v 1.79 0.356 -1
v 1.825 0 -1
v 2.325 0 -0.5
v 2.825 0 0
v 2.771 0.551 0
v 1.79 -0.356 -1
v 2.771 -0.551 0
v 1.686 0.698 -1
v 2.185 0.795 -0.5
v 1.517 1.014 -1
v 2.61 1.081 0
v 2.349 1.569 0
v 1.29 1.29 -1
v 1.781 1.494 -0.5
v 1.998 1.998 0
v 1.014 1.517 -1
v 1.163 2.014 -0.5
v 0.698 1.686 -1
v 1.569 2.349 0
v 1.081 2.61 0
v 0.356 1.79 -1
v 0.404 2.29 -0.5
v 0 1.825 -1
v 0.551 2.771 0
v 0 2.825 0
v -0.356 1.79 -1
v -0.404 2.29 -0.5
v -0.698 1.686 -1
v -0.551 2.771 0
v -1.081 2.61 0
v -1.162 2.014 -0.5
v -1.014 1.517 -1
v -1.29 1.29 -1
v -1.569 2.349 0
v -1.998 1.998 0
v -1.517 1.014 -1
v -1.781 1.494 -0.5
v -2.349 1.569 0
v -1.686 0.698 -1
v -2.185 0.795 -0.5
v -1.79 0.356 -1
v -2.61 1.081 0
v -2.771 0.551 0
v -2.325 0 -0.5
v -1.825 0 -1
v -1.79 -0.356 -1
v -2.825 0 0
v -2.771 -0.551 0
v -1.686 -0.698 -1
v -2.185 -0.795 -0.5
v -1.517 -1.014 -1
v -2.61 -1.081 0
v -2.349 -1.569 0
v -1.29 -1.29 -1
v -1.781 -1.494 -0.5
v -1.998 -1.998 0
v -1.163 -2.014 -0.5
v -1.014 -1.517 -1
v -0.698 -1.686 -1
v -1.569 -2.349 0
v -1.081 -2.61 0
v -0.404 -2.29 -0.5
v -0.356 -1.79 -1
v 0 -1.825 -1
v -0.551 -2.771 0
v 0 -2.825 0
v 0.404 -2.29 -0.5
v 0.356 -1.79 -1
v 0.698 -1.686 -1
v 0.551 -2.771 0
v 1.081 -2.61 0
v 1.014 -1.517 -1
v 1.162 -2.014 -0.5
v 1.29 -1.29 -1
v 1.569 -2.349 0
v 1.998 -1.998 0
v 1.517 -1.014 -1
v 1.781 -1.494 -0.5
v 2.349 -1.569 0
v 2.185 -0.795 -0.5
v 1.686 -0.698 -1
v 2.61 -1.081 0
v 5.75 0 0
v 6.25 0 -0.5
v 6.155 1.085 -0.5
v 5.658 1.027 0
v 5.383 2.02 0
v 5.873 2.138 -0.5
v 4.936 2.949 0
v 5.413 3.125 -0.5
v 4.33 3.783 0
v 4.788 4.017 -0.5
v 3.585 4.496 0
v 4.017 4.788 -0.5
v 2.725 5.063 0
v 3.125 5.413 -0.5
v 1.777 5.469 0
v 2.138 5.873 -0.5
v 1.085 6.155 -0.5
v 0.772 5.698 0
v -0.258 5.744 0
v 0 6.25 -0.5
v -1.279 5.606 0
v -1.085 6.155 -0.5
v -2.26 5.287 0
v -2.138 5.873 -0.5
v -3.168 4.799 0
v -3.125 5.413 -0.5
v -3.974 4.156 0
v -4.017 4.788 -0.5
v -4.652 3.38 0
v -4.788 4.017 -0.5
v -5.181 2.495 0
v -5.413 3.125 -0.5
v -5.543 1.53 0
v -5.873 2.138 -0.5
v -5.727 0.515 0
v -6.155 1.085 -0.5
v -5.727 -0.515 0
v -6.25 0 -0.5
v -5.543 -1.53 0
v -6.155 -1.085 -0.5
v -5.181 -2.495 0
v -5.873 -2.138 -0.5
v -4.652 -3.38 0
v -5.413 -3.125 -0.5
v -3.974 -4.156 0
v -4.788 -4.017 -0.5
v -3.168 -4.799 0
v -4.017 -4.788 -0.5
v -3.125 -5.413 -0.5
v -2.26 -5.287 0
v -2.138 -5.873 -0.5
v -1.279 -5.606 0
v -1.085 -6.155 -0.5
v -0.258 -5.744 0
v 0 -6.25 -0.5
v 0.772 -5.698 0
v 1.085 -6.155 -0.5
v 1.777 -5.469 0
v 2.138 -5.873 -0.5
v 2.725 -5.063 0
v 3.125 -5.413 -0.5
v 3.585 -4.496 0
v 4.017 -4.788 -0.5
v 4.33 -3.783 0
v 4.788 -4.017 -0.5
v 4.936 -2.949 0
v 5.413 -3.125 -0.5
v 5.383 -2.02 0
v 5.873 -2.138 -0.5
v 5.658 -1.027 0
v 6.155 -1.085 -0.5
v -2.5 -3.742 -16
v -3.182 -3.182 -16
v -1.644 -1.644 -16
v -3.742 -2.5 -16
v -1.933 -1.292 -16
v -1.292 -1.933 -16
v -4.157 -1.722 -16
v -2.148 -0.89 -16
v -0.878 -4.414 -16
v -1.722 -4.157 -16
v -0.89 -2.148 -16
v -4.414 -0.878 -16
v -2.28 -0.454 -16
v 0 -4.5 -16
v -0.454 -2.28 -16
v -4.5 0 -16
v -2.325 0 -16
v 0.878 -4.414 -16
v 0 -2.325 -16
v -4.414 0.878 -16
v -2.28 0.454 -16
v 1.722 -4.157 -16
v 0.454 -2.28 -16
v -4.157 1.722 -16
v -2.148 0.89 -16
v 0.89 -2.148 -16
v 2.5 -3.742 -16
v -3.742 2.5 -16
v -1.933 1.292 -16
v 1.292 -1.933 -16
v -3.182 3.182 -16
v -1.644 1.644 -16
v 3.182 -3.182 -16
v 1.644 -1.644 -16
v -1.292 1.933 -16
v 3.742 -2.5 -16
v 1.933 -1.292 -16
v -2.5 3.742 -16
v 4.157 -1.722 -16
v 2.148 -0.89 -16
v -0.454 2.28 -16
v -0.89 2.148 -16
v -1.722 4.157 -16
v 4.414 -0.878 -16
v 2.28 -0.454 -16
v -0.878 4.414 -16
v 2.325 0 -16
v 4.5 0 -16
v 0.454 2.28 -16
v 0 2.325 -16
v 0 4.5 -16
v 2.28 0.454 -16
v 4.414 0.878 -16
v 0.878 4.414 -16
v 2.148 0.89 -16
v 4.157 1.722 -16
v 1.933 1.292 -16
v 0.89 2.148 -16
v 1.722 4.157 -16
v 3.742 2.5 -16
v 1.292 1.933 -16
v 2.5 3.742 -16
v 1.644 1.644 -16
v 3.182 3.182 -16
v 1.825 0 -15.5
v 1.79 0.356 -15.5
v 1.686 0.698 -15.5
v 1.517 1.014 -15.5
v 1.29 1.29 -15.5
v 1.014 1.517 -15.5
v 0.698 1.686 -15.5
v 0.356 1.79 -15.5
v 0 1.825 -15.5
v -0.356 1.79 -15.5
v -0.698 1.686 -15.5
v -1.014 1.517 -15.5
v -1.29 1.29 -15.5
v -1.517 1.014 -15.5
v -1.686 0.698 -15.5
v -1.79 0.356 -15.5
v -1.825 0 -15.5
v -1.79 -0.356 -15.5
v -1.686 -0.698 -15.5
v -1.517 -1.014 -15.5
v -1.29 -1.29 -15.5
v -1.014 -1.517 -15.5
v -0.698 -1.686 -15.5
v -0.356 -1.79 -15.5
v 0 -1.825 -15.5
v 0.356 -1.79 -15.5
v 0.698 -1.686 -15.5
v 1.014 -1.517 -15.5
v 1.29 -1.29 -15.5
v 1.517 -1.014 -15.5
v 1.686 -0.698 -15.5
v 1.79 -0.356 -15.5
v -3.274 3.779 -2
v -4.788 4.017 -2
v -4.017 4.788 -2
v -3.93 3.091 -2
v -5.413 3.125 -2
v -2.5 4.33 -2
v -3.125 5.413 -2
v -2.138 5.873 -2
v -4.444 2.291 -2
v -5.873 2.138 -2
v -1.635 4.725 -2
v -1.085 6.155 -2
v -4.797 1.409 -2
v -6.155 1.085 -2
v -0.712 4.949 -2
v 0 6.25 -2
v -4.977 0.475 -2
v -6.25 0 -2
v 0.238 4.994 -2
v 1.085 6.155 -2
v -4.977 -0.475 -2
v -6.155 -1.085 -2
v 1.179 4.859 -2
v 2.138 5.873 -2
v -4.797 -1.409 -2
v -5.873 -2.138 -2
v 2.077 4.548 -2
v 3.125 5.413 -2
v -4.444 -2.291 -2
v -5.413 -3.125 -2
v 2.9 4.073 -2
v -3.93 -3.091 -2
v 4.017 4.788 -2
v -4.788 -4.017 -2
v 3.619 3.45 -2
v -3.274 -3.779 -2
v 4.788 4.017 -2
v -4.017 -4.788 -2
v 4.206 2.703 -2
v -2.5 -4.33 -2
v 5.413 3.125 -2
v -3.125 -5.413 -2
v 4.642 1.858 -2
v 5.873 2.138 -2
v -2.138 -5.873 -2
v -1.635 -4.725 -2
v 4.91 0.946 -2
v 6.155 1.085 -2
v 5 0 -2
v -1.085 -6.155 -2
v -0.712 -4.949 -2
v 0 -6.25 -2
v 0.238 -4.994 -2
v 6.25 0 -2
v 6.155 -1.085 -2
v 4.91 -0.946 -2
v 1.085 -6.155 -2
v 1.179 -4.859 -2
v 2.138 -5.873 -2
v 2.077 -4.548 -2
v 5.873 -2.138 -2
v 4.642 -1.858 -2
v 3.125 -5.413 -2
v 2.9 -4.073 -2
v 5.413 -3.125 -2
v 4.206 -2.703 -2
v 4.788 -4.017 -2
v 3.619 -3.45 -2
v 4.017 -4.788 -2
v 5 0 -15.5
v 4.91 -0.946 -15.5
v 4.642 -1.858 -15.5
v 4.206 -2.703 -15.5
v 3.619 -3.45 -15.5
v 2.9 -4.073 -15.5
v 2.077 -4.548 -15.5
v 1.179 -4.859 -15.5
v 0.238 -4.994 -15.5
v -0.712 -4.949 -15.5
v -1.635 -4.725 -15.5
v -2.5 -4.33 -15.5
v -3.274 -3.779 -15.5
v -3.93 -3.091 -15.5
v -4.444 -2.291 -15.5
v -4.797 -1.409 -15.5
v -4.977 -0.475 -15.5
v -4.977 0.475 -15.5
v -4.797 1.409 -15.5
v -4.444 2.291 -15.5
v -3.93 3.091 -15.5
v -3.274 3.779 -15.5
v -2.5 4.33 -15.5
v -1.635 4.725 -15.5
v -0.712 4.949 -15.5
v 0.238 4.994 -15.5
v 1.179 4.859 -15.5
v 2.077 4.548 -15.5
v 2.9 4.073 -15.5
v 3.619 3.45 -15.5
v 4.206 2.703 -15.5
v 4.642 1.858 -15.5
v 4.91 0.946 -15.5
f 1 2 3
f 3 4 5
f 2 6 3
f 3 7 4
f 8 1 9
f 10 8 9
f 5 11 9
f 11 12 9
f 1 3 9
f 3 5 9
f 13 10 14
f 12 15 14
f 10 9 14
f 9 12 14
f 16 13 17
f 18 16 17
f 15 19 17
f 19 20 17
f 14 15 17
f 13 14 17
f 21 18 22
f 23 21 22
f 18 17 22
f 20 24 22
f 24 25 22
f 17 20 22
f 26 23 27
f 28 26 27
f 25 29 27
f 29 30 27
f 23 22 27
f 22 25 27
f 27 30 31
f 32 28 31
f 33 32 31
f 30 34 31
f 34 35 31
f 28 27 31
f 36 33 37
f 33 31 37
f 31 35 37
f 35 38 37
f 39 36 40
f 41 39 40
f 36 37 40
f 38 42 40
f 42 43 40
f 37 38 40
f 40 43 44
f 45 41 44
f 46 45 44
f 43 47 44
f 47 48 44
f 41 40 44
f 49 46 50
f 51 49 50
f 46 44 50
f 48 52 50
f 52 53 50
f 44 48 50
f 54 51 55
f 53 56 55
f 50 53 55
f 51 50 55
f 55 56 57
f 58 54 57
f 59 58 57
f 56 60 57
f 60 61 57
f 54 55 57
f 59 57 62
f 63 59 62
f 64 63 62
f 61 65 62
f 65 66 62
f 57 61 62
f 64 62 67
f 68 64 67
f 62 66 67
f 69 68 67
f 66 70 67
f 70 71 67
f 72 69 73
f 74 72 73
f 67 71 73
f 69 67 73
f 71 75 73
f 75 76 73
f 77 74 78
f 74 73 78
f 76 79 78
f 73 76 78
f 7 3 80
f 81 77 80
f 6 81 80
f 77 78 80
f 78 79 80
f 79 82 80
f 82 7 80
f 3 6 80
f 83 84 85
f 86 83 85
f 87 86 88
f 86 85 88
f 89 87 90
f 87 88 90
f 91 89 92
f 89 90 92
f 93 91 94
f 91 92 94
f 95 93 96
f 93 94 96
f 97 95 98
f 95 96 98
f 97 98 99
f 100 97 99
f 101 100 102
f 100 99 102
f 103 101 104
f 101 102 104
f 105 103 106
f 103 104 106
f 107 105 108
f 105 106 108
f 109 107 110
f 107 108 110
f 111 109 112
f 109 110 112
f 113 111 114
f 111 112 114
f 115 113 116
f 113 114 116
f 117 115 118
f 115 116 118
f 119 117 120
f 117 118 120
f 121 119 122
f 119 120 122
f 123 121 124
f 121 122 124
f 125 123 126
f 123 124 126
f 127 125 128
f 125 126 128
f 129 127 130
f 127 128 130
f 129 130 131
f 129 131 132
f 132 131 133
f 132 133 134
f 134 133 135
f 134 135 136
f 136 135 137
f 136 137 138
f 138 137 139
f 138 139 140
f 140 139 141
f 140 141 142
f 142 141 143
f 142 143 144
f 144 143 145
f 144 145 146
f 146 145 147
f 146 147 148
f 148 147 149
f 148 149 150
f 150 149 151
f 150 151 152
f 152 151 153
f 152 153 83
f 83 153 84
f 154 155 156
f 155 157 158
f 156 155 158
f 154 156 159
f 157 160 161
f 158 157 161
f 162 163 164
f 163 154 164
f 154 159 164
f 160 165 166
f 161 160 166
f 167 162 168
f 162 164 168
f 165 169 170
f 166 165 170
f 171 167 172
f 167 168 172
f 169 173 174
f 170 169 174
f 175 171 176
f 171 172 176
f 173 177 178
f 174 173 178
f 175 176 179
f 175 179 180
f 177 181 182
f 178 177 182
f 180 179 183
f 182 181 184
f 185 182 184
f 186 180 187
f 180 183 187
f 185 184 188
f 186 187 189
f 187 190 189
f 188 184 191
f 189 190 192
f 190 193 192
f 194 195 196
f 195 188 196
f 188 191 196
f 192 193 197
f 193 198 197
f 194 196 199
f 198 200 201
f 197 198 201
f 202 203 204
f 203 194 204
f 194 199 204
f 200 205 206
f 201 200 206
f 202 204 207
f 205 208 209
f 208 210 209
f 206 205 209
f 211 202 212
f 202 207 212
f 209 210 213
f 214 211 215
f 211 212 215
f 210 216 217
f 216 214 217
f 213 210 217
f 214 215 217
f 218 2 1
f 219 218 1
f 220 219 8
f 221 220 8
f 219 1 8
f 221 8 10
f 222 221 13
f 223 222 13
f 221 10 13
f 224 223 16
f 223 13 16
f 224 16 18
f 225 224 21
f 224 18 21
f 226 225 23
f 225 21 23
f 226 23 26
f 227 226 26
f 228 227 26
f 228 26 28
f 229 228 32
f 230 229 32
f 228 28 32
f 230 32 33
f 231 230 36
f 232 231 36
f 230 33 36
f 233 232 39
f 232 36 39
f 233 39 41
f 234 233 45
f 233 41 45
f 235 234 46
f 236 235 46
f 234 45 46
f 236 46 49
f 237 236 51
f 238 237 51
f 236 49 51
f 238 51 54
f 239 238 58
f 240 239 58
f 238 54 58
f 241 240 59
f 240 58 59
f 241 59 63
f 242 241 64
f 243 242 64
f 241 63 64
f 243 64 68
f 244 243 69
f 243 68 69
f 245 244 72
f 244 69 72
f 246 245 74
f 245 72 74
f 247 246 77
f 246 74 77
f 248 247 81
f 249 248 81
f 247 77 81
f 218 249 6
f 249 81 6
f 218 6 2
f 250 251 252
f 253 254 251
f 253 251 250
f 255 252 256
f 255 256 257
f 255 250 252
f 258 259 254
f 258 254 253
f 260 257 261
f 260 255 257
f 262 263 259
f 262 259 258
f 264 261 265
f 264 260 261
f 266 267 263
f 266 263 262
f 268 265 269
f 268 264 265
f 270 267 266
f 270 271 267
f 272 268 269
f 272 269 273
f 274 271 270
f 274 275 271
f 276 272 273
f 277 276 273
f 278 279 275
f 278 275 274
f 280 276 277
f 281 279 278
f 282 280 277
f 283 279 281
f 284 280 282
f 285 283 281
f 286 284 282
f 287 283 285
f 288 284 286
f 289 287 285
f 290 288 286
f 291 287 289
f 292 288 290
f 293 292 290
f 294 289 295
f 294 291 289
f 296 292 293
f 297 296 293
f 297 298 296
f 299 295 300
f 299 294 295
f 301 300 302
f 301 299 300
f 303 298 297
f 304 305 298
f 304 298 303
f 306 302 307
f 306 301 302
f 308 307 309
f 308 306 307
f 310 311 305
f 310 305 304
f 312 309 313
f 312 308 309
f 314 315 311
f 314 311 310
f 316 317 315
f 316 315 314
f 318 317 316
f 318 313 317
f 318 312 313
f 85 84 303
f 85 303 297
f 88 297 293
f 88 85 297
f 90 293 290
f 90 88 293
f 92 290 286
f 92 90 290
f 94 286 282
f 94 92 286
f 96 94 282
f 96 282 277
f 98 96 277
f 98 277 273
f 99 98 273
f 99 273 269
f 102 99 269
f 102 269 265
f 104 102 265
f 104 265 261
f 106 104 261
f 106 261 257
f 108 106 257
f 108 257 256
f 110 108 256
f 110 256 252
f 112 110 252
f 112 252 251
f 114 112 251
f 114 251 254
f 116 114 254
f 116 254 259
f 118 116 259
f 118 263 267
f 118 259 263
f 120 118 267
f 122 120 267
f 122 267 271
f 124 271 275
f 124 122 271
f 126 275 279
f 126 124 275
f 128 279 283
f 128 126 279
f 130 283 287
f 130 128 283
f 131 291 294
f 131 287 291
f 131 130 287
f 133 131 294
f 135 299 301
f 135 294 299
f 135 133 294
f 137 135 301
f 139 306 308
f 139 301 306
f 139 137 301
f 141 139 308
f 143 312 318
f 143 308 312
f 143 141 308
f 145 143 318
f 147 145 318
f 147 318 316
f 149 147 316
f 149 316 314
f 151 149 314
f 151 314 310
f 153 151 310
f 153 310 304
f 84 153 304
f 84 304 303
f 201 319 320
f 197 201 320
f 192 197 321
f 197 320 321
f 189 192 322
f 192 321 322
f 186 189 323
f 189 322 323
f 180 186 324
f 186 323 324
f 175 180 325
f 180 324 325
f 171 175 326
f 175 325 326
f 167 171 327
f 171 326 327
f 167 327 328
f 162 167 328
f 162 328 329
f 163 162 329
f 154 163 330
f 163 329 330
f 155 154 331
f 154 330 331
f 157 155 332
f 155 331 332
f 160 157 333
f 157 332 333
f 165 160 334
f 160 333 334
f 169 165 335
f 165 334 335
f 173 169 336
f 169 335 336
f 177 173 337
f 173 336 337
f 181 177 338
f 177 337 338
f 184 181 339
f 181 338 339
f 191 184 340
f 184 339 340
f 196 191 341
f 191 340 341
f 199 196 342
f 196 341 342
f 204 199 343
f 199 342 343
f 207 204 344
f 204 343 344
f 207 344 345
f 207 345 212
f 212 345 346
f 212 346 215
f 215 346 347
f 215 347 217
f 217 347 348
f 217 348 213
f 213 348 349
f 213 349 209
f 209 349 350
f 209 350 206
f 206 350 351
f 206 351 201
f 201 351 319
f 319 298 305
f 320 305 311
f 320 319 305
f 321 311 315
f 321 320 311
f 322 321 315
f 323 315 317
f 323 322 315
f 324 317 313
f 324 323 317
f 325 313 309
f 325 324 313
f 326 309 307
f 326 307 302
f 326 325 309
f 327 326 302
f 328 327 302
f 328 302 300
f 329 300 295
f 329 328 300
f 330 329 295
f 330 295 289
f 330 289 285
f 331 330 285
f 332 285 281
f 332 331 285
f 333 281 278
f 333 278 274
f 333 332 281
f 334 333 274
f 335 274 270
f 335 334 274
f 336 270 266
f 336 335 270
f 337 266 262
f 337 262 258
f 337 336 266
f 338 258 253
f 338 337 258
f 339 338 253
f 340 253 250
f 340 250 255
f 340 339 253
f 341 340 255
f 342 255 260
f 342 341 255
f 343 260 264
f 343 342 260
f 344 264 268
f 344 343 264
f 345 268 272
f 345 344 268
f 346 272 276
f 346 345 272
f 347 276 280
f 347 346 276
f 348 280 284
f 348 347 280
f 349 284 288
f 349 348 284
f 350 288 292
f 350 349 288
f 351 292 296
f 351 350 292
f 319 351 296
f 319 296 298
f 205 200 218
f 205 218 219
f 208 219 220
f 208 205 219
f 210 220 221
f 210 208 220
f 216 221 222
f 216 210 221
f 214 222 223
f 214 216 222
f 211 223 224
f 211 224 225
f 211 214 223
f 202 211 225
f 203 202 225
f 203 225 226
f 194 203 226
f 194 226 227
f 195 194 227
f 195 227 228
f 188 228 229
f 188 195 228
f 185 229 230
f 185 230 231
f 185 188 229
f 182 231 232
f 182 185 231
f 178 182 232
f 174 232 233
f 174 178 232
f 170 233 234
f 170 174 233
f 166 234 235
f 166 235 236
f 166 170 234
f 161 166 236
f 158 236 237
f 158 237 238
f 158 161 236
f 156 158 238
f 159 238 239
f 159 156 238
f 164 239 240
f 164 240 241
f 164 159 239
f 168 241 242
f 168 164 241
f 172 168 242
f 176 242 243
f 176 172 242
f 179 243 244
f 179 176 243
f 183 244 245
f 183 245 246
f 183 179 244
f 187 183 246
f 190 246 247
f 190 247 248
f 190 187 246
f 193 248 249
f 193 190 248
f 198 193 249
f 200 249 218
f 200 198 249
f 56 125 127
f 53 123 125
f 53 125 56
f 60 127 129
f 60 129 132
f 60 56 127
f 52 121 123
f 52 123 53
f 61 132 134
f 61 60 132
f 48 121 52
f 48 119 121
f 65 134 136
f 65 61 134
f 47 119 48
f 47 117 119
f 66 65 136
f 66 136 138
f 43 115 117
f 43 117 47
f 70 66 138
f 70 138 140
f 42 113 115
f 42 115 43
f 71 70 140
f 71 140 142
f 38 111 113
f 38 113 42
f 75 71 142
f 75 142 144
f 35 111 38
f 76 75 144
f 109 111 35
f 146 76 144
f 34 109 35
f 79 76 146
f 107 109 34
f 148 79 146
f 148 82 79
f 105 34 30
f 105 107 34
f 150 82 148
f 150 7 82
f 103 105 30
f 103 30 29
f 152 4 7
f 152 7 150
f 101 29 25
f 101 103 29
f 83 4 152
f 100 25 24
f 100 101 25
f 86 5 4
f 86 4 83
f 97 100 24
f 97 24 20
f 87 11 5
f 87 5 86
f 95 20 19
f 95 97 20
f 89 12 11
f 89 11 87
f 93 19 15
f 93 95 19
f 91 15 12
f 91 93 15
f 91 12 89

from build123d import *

# Parameters (mm, degrees)
F0_R     = 6.25
F0_R_2   = 1.825
F1_DEPTH = 16
F2_SIZE  = 1
F3_R     = 6.25
F3_R_2   = 5
F4_DEPTH = 14
F5_SIZE  = 0.5


with BuildPart() as f1:
    # F0 (on Top) → F1 (new body)
    with BuildSketch(Plane.XY):
        Circle(F0_R)
        Circle(F0_R_2, mode=Mode.SUBTRACT)
    extrude(amount=-F1_DEPTH)

    # F2
    f2_edges = [f1.edges().sort_by_distance(p)[0] for p in [
        (-1.825, 0, 0),
    ]]
    chamfer(f2_edges, length=F2_SIZE)

    # F3 (on face) → F4 (cut)
    with BuildSketch(Plane(origin=(0, 0, -16), x_dir=(1, 0, 0), z_dir=(0, 0, -1))):
        Circle(F3_R)
        Circle(F3_R_2, mode=Mode.SUBTRACT)
    extrude(amount=-F4_DEPTH, mode=Mode.SUBTRACT)

    # F5
    f5_edges = [f1.edges().sort_by_distance(p)[0] for p in [
        (-5, 0, -16),
        (-1.825, 0, -16),
        (-6.25, 0, 0),
    ]]
    chamfer(f5_edges, length=F5_SIZE)


solid = f1.part
